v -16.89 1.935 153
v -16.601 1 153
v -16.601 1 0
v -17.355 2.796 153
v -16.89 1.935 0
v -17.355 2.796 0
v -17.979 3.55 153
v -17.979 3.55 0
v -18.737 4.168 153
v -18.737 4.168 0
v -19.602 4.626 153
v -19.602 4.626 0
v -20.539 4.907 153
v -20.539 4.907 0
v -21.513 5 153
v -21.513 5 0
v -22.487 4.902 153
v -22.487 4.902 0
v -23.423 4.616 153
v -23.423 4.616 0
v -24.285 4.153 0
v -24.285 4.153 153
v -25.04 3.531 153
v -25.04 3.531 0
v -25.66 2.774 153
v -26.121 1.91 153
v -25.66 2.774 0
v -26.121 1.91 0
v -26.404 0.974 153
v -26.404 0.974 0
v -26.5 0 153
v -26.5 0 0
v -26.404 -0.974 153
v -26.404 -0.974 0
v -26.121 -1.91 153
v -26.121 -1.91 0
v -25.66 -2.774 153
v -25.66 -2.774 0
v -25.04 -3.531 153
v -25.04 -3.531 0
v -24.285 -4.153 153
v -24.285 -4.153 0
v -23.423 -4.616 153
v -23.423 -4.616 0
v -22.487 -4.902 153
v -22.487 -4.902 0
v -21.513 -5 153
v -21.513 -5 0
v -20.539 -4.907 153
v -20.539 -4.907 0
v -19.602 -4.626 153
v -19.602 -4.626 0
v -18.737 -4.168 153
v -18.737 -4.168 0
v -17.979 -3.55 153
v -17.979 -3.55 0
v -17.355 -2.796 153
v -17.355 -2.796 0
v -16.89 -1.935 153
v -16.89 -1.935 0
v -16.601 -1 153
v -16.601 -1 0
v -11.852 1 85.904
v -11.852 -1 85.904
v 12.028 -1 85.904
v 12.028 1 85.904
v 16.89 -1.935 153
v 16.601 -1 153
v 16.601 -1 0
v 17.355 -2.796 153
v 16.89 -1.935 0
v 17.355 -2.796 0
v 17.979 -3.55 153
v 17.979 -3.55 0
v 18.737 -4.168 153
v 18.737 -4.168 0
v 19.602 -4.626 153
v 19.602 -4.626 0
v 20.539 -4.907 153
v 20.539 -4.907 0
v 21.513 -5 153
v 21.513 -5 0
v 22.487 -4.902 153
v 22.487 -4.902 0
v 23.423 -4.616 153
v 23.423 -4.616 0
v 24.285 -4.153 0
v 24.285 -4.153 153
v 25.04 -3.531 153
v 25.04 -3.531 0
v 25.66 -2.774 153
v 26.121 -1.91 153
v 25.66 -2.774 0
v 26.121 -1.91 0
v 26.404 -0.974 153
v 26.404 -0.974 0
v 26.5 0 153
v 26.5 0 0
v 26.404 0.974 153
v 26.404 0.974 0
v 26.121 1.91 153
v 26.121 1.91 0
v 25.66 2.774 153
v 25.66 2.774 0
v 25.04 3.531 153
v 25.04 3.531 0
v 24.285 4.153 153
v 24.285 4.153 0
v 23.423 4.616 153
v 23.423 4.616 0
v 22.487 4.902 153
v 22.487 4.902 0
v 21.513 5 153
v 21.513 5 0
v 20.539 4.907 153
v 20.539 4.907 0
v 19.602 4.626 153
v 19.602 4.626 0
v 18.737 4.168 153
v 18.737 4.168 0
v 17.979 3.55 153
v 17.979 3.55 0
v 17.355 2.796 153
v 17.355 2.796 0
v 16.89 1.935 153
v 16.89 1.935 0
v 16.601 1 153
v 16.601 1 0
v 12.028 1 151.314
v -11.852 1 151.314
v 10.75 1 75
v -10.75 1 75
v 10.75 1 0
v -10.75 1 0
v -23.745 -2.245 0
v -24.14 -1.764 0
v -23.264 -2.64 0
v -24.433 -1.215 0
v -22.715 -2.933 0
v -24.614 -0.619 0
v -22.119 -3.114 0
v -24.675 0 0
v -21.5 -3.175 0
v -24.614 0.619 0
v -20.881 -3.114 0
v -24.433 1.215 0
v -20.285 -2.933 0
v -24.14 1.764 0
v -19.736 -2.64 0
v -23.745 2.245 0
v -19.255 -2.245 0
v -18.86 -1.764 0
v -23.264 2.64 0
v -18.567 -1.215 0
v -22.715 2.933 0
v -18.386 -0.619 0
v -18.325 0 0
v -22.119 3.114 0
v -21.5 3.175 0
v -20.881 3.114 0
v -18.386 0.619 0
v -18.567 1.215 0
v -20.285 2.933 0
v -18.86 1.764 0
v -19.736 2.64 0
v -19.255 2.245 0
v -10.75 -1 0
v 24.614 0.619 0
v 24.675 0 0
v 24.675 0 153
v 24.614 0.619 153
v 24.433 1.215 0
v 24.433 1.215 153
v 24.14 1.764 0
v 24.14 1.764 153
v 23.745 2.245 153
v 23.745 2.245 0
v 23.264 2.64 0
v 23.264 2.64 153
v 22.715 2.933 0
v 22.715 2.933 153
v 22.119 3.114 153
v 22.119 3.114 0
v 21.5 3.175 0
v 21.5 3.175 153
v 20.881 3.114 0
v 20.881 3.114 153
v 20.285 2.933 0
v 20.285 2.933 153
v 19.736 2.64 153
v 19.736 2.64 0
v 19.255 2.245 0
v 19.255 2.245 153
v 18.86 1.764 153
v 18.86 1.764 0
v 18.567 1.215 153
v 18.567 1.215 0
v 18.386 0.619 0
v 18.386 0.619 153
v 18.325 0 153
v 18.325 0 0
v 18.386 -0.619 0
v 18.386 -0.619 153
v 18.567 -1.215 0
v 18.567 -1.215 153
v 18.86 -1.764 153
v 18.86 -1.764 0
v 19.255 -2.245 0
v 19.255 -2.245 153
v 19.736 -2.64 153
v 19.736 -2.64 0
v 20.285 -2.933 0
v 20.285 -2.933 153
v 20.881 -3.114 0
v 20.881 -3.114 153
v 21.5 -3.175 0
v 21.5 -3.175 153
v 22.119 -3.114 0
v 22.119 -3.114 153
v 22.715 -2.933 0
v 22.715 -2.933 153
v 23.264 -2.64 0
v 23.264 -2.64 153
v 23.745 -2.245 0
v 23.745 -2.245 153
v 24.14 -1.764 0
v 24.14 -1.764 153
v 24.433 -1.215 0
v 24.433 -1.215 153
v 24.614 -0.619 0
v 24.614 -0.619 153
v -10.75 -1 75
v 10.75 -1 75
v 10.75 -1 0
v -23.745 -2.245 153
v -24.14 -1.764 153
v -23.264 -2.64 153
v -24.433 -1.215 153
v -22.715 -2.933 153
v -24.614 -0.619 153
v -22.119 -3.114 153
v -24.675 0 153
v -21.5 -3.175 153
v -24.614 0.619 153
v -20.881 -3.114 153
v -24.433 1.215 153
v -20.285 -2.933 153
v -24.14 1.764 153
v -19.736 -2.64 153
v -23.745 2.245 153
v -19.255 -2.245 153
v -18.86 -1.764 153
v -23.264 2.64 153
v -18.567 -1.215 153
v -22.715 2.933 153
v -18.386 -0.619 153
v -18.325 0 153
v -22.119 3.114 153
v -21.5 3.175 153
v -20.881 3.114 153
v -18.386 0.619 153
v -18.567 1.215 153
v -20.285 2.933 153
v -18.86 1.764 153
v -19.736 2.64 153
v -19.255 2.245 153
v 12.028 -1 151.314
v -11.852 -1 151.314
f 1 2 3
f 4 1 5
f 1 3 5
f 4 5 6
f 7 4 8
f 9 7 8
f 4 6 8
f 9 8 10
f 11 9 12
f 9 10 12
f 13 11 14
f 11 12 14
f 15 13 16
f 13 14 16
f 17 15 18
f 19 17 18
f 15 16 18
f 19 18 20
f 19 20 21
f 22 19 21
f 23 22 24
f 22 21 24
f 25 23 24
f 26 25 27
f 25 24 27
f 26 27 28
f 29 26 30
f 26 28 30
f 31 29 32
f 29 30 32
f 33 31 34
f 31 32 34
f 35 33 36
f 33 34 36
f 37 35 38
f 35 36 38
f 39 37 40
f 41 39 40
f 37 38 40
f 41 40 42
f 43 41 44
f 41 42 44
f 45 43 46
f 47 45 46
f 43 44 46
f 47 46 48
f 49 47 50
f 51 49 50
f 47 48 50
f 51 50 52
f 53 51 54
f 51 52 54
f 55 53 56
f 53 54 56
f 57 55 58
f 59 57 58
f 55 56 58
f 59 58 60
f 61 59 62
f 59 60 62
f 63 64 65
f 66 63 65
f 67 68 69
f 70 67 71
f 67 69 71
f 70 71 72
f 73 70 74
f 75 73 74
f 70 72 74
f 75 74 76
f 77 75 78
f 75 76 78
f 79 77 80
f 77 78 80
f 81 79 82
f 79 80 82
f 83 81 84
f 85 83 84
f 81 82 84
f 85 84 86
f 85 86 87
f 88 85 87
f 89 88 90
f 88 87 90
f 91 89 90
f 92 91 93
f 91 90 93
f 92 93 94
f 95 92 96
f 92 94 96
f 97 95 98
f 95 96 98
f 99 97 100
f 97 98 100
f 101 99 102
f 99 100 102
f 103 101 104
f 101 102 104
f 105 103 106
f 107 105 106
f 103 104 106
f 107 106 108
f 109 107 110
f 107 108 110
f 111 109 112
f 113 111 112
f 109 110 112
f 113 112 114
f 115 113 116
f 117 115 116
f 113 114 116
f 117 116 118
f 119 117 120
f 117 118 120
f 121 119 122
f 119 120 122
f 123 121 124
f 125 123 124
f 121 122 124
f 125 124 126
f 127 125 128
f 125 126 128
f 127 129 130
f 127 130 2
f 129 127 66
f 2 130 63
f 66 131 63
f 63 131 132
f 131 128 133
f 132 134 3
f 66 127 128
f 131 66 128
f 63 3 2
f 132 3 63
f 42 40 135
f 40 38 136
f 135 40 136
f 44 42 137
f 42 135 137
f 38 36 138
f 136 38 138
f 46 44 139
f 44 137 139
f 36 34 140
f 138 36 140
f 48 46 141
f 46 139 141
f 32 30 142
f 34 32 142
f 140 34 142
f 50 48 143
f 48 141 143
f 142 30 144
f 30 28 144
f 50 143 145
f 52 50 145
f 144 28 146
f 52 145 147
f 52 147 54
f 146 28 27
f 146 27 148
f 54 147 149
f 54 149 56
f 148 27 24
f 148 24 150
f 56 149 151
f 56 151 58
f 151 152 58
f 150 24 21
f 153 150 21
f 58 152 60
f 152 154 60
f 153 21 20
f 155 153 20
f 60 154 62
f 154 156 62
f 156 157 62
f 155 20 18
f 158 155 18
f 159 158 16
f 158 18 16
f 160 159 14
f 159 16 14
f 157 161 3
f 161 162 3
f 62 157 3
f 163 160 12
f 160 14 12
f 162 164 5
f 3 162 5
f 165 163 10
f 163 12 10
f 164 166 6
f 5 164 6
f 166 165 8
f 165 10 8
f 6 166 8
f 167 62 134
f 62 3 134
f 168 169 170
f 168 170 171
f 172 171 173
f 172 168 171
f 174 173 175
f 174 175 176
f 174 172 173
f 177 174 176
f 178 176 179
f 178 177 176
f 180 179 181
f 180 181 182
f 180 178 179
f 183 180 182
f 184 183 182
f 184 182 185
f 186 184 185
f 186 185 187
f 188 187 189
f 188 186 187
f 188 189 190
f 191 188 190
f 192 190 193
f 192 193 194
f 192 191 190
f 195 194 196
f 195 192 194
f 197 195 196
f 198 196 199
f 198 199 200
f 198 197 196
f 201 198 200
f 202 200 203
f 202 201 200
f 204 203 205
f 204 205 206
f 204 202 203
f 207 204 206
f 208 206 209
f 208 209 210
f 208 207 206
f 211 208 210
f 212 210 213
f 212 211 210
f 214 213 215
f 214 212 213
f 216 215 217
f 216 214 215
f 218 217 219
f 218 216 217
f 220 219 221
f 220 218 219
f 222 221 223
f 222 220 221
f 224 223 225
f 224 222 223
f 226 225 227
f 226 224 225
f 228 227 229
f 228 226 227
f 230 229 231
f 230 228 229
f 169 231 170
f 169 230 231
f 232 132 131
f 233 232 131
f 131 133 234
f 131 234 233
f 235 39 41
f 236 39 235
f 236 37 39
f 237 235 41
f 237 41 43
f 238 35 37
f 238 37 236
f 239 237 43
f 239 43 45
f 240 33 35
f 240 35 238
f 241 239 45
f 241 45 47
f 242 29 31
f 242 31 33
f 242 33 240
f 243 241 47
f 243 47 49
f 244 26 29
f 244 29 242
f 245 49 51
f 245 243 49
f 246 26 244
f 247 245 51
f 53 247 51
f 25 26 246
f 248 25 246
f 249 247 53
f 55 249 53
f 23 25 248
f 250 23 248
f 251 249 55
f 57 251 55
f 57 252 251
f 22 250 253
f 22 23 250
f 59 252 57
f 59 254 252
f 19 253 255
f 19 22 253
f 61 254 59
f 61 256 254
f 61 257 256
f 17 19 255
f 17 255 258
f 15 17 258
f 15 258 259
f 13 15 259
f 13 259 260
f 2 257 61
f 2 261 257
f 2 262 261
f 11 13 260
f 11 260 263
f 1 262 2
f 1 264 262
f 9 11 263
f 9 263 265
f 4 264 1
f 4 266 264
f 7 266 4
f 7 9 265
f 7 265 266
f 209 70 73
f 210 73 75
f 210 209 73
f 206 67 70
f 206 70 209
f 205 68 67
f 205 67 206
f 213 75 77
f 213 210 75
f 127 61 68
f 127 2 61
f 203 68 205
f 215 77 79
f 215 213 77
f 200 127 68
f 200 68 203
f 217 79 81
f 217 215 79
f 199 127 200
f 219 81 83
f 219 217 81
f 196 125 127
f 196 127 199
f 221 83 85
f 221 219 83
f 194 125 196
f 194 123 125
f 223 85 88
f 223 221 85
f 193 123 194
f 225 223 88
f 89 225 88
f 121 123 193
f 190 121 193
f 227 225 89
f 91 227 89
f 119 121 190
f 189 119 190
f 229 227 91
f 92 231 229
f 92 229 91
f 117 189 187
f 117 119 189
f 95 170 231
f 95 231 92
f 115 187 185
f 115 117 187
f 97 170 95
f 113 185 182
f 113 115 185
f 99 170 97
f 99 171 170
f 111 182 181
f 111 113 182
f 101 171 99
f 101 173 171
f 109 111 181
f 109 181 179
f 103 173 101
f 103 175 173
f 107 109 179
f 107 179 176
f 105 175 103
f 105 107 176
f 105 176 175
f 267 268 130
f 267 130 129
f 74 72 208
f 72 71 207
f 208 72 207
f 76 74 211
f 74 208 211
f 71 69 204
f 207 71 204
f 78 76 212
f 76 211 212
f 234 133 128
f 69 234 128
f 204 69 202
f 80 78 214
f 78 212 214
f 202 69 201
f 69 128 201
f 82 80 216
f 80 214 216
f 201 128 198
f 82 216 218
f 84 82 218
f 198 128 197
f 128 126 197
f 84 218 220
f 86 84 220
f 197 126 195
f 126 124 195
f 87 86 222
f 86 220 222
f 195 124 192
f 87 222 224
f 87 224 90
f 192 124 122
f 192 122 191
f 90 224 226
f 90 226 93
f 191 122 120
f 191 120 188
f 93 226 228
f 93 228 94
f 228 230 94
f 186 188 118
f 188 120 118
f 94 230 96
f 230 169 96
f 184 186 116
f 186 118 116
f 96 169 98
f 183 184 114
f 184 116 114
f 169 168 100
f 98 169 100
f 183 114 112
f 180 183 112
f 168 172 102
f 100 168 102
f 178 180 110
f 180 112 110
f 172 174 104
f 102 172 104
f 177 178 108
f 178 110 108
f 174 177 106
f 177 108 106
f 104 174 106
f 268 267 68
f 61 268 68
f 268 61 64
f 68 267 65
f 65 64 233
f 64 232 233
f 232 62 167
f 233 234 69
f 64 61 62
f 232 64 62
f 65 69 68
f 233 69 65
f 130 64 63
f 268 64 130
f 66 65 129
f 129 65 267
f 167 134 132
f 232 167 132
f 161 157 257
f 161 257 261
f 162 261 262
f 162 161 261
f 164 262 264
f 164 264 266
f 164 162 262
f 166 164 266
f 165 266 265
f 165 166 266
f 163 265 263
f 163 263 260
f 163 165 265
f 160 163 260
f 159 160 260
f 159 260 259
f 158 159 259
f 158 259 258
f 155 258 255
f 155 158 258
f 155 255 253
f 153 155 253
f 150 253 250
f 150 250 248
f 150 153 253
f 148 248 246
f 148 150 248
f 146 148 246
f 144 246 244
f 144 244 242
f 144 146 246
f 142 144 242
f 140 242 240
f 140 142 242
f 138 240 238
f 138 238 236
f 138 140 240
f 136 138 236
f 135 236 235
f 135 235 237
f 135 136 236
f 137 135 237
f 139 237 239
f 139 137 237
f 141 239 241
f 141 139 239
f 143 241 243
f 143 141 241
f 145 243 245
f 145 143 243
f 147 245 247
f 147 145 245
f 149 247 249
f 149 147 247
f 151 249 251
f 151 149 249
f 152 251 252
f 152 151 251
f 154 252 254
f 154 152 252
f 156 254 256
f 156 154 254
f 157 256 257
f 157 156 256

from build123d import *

# Parameters (mm, degrees)
F0_R     = 3.175
F1_DEPTH = 153
F2_W     = 21.5
F2_H     = 75
F2_W_2   = 23.88
F2_H_2   = 65.41
F3_DEPTH = 12.5


with BuildPart() as f1:
    # F0 (on Top) → F1 (new body)
    with BuildSketch(Plane.XY):
        with BuildLine():
            Line((-16.601021, -1), (16.601021, -1))
            ThreePointArc((16.601021, -1), (26.5, 0), (16.601021, 1))
            Line((16.601021, 1), (-16.601021, 1))
            ThreePointArc((-16.601021, 1), (-26.5, 0), (-16.601021, -1))
        make_face()
        with Locations((-21.5, 0)):
            Circle(F0_R, mode=Mode.SUBTRACT)
        with Locations((21.5, 0)):
            Circle(F0_R, mode=Mode.SUBTRACT)
    extrude(amount=F1_DEPTH)

    # F2 (on Front) → F3 (cut, symmetric)
    with BuildSketch(Plane.XZ):
        with Locations((0, 37.5)):
            Rectangle(F2_W, F2_H)
        with Locations((0.08833, 118.608861)):
            Rectangle(F2_W_2, F2_H_2)
    extrude(amount=F3_DEPTH, both=True, mode=Mode.SUBTRACT)


solid = f1.part
